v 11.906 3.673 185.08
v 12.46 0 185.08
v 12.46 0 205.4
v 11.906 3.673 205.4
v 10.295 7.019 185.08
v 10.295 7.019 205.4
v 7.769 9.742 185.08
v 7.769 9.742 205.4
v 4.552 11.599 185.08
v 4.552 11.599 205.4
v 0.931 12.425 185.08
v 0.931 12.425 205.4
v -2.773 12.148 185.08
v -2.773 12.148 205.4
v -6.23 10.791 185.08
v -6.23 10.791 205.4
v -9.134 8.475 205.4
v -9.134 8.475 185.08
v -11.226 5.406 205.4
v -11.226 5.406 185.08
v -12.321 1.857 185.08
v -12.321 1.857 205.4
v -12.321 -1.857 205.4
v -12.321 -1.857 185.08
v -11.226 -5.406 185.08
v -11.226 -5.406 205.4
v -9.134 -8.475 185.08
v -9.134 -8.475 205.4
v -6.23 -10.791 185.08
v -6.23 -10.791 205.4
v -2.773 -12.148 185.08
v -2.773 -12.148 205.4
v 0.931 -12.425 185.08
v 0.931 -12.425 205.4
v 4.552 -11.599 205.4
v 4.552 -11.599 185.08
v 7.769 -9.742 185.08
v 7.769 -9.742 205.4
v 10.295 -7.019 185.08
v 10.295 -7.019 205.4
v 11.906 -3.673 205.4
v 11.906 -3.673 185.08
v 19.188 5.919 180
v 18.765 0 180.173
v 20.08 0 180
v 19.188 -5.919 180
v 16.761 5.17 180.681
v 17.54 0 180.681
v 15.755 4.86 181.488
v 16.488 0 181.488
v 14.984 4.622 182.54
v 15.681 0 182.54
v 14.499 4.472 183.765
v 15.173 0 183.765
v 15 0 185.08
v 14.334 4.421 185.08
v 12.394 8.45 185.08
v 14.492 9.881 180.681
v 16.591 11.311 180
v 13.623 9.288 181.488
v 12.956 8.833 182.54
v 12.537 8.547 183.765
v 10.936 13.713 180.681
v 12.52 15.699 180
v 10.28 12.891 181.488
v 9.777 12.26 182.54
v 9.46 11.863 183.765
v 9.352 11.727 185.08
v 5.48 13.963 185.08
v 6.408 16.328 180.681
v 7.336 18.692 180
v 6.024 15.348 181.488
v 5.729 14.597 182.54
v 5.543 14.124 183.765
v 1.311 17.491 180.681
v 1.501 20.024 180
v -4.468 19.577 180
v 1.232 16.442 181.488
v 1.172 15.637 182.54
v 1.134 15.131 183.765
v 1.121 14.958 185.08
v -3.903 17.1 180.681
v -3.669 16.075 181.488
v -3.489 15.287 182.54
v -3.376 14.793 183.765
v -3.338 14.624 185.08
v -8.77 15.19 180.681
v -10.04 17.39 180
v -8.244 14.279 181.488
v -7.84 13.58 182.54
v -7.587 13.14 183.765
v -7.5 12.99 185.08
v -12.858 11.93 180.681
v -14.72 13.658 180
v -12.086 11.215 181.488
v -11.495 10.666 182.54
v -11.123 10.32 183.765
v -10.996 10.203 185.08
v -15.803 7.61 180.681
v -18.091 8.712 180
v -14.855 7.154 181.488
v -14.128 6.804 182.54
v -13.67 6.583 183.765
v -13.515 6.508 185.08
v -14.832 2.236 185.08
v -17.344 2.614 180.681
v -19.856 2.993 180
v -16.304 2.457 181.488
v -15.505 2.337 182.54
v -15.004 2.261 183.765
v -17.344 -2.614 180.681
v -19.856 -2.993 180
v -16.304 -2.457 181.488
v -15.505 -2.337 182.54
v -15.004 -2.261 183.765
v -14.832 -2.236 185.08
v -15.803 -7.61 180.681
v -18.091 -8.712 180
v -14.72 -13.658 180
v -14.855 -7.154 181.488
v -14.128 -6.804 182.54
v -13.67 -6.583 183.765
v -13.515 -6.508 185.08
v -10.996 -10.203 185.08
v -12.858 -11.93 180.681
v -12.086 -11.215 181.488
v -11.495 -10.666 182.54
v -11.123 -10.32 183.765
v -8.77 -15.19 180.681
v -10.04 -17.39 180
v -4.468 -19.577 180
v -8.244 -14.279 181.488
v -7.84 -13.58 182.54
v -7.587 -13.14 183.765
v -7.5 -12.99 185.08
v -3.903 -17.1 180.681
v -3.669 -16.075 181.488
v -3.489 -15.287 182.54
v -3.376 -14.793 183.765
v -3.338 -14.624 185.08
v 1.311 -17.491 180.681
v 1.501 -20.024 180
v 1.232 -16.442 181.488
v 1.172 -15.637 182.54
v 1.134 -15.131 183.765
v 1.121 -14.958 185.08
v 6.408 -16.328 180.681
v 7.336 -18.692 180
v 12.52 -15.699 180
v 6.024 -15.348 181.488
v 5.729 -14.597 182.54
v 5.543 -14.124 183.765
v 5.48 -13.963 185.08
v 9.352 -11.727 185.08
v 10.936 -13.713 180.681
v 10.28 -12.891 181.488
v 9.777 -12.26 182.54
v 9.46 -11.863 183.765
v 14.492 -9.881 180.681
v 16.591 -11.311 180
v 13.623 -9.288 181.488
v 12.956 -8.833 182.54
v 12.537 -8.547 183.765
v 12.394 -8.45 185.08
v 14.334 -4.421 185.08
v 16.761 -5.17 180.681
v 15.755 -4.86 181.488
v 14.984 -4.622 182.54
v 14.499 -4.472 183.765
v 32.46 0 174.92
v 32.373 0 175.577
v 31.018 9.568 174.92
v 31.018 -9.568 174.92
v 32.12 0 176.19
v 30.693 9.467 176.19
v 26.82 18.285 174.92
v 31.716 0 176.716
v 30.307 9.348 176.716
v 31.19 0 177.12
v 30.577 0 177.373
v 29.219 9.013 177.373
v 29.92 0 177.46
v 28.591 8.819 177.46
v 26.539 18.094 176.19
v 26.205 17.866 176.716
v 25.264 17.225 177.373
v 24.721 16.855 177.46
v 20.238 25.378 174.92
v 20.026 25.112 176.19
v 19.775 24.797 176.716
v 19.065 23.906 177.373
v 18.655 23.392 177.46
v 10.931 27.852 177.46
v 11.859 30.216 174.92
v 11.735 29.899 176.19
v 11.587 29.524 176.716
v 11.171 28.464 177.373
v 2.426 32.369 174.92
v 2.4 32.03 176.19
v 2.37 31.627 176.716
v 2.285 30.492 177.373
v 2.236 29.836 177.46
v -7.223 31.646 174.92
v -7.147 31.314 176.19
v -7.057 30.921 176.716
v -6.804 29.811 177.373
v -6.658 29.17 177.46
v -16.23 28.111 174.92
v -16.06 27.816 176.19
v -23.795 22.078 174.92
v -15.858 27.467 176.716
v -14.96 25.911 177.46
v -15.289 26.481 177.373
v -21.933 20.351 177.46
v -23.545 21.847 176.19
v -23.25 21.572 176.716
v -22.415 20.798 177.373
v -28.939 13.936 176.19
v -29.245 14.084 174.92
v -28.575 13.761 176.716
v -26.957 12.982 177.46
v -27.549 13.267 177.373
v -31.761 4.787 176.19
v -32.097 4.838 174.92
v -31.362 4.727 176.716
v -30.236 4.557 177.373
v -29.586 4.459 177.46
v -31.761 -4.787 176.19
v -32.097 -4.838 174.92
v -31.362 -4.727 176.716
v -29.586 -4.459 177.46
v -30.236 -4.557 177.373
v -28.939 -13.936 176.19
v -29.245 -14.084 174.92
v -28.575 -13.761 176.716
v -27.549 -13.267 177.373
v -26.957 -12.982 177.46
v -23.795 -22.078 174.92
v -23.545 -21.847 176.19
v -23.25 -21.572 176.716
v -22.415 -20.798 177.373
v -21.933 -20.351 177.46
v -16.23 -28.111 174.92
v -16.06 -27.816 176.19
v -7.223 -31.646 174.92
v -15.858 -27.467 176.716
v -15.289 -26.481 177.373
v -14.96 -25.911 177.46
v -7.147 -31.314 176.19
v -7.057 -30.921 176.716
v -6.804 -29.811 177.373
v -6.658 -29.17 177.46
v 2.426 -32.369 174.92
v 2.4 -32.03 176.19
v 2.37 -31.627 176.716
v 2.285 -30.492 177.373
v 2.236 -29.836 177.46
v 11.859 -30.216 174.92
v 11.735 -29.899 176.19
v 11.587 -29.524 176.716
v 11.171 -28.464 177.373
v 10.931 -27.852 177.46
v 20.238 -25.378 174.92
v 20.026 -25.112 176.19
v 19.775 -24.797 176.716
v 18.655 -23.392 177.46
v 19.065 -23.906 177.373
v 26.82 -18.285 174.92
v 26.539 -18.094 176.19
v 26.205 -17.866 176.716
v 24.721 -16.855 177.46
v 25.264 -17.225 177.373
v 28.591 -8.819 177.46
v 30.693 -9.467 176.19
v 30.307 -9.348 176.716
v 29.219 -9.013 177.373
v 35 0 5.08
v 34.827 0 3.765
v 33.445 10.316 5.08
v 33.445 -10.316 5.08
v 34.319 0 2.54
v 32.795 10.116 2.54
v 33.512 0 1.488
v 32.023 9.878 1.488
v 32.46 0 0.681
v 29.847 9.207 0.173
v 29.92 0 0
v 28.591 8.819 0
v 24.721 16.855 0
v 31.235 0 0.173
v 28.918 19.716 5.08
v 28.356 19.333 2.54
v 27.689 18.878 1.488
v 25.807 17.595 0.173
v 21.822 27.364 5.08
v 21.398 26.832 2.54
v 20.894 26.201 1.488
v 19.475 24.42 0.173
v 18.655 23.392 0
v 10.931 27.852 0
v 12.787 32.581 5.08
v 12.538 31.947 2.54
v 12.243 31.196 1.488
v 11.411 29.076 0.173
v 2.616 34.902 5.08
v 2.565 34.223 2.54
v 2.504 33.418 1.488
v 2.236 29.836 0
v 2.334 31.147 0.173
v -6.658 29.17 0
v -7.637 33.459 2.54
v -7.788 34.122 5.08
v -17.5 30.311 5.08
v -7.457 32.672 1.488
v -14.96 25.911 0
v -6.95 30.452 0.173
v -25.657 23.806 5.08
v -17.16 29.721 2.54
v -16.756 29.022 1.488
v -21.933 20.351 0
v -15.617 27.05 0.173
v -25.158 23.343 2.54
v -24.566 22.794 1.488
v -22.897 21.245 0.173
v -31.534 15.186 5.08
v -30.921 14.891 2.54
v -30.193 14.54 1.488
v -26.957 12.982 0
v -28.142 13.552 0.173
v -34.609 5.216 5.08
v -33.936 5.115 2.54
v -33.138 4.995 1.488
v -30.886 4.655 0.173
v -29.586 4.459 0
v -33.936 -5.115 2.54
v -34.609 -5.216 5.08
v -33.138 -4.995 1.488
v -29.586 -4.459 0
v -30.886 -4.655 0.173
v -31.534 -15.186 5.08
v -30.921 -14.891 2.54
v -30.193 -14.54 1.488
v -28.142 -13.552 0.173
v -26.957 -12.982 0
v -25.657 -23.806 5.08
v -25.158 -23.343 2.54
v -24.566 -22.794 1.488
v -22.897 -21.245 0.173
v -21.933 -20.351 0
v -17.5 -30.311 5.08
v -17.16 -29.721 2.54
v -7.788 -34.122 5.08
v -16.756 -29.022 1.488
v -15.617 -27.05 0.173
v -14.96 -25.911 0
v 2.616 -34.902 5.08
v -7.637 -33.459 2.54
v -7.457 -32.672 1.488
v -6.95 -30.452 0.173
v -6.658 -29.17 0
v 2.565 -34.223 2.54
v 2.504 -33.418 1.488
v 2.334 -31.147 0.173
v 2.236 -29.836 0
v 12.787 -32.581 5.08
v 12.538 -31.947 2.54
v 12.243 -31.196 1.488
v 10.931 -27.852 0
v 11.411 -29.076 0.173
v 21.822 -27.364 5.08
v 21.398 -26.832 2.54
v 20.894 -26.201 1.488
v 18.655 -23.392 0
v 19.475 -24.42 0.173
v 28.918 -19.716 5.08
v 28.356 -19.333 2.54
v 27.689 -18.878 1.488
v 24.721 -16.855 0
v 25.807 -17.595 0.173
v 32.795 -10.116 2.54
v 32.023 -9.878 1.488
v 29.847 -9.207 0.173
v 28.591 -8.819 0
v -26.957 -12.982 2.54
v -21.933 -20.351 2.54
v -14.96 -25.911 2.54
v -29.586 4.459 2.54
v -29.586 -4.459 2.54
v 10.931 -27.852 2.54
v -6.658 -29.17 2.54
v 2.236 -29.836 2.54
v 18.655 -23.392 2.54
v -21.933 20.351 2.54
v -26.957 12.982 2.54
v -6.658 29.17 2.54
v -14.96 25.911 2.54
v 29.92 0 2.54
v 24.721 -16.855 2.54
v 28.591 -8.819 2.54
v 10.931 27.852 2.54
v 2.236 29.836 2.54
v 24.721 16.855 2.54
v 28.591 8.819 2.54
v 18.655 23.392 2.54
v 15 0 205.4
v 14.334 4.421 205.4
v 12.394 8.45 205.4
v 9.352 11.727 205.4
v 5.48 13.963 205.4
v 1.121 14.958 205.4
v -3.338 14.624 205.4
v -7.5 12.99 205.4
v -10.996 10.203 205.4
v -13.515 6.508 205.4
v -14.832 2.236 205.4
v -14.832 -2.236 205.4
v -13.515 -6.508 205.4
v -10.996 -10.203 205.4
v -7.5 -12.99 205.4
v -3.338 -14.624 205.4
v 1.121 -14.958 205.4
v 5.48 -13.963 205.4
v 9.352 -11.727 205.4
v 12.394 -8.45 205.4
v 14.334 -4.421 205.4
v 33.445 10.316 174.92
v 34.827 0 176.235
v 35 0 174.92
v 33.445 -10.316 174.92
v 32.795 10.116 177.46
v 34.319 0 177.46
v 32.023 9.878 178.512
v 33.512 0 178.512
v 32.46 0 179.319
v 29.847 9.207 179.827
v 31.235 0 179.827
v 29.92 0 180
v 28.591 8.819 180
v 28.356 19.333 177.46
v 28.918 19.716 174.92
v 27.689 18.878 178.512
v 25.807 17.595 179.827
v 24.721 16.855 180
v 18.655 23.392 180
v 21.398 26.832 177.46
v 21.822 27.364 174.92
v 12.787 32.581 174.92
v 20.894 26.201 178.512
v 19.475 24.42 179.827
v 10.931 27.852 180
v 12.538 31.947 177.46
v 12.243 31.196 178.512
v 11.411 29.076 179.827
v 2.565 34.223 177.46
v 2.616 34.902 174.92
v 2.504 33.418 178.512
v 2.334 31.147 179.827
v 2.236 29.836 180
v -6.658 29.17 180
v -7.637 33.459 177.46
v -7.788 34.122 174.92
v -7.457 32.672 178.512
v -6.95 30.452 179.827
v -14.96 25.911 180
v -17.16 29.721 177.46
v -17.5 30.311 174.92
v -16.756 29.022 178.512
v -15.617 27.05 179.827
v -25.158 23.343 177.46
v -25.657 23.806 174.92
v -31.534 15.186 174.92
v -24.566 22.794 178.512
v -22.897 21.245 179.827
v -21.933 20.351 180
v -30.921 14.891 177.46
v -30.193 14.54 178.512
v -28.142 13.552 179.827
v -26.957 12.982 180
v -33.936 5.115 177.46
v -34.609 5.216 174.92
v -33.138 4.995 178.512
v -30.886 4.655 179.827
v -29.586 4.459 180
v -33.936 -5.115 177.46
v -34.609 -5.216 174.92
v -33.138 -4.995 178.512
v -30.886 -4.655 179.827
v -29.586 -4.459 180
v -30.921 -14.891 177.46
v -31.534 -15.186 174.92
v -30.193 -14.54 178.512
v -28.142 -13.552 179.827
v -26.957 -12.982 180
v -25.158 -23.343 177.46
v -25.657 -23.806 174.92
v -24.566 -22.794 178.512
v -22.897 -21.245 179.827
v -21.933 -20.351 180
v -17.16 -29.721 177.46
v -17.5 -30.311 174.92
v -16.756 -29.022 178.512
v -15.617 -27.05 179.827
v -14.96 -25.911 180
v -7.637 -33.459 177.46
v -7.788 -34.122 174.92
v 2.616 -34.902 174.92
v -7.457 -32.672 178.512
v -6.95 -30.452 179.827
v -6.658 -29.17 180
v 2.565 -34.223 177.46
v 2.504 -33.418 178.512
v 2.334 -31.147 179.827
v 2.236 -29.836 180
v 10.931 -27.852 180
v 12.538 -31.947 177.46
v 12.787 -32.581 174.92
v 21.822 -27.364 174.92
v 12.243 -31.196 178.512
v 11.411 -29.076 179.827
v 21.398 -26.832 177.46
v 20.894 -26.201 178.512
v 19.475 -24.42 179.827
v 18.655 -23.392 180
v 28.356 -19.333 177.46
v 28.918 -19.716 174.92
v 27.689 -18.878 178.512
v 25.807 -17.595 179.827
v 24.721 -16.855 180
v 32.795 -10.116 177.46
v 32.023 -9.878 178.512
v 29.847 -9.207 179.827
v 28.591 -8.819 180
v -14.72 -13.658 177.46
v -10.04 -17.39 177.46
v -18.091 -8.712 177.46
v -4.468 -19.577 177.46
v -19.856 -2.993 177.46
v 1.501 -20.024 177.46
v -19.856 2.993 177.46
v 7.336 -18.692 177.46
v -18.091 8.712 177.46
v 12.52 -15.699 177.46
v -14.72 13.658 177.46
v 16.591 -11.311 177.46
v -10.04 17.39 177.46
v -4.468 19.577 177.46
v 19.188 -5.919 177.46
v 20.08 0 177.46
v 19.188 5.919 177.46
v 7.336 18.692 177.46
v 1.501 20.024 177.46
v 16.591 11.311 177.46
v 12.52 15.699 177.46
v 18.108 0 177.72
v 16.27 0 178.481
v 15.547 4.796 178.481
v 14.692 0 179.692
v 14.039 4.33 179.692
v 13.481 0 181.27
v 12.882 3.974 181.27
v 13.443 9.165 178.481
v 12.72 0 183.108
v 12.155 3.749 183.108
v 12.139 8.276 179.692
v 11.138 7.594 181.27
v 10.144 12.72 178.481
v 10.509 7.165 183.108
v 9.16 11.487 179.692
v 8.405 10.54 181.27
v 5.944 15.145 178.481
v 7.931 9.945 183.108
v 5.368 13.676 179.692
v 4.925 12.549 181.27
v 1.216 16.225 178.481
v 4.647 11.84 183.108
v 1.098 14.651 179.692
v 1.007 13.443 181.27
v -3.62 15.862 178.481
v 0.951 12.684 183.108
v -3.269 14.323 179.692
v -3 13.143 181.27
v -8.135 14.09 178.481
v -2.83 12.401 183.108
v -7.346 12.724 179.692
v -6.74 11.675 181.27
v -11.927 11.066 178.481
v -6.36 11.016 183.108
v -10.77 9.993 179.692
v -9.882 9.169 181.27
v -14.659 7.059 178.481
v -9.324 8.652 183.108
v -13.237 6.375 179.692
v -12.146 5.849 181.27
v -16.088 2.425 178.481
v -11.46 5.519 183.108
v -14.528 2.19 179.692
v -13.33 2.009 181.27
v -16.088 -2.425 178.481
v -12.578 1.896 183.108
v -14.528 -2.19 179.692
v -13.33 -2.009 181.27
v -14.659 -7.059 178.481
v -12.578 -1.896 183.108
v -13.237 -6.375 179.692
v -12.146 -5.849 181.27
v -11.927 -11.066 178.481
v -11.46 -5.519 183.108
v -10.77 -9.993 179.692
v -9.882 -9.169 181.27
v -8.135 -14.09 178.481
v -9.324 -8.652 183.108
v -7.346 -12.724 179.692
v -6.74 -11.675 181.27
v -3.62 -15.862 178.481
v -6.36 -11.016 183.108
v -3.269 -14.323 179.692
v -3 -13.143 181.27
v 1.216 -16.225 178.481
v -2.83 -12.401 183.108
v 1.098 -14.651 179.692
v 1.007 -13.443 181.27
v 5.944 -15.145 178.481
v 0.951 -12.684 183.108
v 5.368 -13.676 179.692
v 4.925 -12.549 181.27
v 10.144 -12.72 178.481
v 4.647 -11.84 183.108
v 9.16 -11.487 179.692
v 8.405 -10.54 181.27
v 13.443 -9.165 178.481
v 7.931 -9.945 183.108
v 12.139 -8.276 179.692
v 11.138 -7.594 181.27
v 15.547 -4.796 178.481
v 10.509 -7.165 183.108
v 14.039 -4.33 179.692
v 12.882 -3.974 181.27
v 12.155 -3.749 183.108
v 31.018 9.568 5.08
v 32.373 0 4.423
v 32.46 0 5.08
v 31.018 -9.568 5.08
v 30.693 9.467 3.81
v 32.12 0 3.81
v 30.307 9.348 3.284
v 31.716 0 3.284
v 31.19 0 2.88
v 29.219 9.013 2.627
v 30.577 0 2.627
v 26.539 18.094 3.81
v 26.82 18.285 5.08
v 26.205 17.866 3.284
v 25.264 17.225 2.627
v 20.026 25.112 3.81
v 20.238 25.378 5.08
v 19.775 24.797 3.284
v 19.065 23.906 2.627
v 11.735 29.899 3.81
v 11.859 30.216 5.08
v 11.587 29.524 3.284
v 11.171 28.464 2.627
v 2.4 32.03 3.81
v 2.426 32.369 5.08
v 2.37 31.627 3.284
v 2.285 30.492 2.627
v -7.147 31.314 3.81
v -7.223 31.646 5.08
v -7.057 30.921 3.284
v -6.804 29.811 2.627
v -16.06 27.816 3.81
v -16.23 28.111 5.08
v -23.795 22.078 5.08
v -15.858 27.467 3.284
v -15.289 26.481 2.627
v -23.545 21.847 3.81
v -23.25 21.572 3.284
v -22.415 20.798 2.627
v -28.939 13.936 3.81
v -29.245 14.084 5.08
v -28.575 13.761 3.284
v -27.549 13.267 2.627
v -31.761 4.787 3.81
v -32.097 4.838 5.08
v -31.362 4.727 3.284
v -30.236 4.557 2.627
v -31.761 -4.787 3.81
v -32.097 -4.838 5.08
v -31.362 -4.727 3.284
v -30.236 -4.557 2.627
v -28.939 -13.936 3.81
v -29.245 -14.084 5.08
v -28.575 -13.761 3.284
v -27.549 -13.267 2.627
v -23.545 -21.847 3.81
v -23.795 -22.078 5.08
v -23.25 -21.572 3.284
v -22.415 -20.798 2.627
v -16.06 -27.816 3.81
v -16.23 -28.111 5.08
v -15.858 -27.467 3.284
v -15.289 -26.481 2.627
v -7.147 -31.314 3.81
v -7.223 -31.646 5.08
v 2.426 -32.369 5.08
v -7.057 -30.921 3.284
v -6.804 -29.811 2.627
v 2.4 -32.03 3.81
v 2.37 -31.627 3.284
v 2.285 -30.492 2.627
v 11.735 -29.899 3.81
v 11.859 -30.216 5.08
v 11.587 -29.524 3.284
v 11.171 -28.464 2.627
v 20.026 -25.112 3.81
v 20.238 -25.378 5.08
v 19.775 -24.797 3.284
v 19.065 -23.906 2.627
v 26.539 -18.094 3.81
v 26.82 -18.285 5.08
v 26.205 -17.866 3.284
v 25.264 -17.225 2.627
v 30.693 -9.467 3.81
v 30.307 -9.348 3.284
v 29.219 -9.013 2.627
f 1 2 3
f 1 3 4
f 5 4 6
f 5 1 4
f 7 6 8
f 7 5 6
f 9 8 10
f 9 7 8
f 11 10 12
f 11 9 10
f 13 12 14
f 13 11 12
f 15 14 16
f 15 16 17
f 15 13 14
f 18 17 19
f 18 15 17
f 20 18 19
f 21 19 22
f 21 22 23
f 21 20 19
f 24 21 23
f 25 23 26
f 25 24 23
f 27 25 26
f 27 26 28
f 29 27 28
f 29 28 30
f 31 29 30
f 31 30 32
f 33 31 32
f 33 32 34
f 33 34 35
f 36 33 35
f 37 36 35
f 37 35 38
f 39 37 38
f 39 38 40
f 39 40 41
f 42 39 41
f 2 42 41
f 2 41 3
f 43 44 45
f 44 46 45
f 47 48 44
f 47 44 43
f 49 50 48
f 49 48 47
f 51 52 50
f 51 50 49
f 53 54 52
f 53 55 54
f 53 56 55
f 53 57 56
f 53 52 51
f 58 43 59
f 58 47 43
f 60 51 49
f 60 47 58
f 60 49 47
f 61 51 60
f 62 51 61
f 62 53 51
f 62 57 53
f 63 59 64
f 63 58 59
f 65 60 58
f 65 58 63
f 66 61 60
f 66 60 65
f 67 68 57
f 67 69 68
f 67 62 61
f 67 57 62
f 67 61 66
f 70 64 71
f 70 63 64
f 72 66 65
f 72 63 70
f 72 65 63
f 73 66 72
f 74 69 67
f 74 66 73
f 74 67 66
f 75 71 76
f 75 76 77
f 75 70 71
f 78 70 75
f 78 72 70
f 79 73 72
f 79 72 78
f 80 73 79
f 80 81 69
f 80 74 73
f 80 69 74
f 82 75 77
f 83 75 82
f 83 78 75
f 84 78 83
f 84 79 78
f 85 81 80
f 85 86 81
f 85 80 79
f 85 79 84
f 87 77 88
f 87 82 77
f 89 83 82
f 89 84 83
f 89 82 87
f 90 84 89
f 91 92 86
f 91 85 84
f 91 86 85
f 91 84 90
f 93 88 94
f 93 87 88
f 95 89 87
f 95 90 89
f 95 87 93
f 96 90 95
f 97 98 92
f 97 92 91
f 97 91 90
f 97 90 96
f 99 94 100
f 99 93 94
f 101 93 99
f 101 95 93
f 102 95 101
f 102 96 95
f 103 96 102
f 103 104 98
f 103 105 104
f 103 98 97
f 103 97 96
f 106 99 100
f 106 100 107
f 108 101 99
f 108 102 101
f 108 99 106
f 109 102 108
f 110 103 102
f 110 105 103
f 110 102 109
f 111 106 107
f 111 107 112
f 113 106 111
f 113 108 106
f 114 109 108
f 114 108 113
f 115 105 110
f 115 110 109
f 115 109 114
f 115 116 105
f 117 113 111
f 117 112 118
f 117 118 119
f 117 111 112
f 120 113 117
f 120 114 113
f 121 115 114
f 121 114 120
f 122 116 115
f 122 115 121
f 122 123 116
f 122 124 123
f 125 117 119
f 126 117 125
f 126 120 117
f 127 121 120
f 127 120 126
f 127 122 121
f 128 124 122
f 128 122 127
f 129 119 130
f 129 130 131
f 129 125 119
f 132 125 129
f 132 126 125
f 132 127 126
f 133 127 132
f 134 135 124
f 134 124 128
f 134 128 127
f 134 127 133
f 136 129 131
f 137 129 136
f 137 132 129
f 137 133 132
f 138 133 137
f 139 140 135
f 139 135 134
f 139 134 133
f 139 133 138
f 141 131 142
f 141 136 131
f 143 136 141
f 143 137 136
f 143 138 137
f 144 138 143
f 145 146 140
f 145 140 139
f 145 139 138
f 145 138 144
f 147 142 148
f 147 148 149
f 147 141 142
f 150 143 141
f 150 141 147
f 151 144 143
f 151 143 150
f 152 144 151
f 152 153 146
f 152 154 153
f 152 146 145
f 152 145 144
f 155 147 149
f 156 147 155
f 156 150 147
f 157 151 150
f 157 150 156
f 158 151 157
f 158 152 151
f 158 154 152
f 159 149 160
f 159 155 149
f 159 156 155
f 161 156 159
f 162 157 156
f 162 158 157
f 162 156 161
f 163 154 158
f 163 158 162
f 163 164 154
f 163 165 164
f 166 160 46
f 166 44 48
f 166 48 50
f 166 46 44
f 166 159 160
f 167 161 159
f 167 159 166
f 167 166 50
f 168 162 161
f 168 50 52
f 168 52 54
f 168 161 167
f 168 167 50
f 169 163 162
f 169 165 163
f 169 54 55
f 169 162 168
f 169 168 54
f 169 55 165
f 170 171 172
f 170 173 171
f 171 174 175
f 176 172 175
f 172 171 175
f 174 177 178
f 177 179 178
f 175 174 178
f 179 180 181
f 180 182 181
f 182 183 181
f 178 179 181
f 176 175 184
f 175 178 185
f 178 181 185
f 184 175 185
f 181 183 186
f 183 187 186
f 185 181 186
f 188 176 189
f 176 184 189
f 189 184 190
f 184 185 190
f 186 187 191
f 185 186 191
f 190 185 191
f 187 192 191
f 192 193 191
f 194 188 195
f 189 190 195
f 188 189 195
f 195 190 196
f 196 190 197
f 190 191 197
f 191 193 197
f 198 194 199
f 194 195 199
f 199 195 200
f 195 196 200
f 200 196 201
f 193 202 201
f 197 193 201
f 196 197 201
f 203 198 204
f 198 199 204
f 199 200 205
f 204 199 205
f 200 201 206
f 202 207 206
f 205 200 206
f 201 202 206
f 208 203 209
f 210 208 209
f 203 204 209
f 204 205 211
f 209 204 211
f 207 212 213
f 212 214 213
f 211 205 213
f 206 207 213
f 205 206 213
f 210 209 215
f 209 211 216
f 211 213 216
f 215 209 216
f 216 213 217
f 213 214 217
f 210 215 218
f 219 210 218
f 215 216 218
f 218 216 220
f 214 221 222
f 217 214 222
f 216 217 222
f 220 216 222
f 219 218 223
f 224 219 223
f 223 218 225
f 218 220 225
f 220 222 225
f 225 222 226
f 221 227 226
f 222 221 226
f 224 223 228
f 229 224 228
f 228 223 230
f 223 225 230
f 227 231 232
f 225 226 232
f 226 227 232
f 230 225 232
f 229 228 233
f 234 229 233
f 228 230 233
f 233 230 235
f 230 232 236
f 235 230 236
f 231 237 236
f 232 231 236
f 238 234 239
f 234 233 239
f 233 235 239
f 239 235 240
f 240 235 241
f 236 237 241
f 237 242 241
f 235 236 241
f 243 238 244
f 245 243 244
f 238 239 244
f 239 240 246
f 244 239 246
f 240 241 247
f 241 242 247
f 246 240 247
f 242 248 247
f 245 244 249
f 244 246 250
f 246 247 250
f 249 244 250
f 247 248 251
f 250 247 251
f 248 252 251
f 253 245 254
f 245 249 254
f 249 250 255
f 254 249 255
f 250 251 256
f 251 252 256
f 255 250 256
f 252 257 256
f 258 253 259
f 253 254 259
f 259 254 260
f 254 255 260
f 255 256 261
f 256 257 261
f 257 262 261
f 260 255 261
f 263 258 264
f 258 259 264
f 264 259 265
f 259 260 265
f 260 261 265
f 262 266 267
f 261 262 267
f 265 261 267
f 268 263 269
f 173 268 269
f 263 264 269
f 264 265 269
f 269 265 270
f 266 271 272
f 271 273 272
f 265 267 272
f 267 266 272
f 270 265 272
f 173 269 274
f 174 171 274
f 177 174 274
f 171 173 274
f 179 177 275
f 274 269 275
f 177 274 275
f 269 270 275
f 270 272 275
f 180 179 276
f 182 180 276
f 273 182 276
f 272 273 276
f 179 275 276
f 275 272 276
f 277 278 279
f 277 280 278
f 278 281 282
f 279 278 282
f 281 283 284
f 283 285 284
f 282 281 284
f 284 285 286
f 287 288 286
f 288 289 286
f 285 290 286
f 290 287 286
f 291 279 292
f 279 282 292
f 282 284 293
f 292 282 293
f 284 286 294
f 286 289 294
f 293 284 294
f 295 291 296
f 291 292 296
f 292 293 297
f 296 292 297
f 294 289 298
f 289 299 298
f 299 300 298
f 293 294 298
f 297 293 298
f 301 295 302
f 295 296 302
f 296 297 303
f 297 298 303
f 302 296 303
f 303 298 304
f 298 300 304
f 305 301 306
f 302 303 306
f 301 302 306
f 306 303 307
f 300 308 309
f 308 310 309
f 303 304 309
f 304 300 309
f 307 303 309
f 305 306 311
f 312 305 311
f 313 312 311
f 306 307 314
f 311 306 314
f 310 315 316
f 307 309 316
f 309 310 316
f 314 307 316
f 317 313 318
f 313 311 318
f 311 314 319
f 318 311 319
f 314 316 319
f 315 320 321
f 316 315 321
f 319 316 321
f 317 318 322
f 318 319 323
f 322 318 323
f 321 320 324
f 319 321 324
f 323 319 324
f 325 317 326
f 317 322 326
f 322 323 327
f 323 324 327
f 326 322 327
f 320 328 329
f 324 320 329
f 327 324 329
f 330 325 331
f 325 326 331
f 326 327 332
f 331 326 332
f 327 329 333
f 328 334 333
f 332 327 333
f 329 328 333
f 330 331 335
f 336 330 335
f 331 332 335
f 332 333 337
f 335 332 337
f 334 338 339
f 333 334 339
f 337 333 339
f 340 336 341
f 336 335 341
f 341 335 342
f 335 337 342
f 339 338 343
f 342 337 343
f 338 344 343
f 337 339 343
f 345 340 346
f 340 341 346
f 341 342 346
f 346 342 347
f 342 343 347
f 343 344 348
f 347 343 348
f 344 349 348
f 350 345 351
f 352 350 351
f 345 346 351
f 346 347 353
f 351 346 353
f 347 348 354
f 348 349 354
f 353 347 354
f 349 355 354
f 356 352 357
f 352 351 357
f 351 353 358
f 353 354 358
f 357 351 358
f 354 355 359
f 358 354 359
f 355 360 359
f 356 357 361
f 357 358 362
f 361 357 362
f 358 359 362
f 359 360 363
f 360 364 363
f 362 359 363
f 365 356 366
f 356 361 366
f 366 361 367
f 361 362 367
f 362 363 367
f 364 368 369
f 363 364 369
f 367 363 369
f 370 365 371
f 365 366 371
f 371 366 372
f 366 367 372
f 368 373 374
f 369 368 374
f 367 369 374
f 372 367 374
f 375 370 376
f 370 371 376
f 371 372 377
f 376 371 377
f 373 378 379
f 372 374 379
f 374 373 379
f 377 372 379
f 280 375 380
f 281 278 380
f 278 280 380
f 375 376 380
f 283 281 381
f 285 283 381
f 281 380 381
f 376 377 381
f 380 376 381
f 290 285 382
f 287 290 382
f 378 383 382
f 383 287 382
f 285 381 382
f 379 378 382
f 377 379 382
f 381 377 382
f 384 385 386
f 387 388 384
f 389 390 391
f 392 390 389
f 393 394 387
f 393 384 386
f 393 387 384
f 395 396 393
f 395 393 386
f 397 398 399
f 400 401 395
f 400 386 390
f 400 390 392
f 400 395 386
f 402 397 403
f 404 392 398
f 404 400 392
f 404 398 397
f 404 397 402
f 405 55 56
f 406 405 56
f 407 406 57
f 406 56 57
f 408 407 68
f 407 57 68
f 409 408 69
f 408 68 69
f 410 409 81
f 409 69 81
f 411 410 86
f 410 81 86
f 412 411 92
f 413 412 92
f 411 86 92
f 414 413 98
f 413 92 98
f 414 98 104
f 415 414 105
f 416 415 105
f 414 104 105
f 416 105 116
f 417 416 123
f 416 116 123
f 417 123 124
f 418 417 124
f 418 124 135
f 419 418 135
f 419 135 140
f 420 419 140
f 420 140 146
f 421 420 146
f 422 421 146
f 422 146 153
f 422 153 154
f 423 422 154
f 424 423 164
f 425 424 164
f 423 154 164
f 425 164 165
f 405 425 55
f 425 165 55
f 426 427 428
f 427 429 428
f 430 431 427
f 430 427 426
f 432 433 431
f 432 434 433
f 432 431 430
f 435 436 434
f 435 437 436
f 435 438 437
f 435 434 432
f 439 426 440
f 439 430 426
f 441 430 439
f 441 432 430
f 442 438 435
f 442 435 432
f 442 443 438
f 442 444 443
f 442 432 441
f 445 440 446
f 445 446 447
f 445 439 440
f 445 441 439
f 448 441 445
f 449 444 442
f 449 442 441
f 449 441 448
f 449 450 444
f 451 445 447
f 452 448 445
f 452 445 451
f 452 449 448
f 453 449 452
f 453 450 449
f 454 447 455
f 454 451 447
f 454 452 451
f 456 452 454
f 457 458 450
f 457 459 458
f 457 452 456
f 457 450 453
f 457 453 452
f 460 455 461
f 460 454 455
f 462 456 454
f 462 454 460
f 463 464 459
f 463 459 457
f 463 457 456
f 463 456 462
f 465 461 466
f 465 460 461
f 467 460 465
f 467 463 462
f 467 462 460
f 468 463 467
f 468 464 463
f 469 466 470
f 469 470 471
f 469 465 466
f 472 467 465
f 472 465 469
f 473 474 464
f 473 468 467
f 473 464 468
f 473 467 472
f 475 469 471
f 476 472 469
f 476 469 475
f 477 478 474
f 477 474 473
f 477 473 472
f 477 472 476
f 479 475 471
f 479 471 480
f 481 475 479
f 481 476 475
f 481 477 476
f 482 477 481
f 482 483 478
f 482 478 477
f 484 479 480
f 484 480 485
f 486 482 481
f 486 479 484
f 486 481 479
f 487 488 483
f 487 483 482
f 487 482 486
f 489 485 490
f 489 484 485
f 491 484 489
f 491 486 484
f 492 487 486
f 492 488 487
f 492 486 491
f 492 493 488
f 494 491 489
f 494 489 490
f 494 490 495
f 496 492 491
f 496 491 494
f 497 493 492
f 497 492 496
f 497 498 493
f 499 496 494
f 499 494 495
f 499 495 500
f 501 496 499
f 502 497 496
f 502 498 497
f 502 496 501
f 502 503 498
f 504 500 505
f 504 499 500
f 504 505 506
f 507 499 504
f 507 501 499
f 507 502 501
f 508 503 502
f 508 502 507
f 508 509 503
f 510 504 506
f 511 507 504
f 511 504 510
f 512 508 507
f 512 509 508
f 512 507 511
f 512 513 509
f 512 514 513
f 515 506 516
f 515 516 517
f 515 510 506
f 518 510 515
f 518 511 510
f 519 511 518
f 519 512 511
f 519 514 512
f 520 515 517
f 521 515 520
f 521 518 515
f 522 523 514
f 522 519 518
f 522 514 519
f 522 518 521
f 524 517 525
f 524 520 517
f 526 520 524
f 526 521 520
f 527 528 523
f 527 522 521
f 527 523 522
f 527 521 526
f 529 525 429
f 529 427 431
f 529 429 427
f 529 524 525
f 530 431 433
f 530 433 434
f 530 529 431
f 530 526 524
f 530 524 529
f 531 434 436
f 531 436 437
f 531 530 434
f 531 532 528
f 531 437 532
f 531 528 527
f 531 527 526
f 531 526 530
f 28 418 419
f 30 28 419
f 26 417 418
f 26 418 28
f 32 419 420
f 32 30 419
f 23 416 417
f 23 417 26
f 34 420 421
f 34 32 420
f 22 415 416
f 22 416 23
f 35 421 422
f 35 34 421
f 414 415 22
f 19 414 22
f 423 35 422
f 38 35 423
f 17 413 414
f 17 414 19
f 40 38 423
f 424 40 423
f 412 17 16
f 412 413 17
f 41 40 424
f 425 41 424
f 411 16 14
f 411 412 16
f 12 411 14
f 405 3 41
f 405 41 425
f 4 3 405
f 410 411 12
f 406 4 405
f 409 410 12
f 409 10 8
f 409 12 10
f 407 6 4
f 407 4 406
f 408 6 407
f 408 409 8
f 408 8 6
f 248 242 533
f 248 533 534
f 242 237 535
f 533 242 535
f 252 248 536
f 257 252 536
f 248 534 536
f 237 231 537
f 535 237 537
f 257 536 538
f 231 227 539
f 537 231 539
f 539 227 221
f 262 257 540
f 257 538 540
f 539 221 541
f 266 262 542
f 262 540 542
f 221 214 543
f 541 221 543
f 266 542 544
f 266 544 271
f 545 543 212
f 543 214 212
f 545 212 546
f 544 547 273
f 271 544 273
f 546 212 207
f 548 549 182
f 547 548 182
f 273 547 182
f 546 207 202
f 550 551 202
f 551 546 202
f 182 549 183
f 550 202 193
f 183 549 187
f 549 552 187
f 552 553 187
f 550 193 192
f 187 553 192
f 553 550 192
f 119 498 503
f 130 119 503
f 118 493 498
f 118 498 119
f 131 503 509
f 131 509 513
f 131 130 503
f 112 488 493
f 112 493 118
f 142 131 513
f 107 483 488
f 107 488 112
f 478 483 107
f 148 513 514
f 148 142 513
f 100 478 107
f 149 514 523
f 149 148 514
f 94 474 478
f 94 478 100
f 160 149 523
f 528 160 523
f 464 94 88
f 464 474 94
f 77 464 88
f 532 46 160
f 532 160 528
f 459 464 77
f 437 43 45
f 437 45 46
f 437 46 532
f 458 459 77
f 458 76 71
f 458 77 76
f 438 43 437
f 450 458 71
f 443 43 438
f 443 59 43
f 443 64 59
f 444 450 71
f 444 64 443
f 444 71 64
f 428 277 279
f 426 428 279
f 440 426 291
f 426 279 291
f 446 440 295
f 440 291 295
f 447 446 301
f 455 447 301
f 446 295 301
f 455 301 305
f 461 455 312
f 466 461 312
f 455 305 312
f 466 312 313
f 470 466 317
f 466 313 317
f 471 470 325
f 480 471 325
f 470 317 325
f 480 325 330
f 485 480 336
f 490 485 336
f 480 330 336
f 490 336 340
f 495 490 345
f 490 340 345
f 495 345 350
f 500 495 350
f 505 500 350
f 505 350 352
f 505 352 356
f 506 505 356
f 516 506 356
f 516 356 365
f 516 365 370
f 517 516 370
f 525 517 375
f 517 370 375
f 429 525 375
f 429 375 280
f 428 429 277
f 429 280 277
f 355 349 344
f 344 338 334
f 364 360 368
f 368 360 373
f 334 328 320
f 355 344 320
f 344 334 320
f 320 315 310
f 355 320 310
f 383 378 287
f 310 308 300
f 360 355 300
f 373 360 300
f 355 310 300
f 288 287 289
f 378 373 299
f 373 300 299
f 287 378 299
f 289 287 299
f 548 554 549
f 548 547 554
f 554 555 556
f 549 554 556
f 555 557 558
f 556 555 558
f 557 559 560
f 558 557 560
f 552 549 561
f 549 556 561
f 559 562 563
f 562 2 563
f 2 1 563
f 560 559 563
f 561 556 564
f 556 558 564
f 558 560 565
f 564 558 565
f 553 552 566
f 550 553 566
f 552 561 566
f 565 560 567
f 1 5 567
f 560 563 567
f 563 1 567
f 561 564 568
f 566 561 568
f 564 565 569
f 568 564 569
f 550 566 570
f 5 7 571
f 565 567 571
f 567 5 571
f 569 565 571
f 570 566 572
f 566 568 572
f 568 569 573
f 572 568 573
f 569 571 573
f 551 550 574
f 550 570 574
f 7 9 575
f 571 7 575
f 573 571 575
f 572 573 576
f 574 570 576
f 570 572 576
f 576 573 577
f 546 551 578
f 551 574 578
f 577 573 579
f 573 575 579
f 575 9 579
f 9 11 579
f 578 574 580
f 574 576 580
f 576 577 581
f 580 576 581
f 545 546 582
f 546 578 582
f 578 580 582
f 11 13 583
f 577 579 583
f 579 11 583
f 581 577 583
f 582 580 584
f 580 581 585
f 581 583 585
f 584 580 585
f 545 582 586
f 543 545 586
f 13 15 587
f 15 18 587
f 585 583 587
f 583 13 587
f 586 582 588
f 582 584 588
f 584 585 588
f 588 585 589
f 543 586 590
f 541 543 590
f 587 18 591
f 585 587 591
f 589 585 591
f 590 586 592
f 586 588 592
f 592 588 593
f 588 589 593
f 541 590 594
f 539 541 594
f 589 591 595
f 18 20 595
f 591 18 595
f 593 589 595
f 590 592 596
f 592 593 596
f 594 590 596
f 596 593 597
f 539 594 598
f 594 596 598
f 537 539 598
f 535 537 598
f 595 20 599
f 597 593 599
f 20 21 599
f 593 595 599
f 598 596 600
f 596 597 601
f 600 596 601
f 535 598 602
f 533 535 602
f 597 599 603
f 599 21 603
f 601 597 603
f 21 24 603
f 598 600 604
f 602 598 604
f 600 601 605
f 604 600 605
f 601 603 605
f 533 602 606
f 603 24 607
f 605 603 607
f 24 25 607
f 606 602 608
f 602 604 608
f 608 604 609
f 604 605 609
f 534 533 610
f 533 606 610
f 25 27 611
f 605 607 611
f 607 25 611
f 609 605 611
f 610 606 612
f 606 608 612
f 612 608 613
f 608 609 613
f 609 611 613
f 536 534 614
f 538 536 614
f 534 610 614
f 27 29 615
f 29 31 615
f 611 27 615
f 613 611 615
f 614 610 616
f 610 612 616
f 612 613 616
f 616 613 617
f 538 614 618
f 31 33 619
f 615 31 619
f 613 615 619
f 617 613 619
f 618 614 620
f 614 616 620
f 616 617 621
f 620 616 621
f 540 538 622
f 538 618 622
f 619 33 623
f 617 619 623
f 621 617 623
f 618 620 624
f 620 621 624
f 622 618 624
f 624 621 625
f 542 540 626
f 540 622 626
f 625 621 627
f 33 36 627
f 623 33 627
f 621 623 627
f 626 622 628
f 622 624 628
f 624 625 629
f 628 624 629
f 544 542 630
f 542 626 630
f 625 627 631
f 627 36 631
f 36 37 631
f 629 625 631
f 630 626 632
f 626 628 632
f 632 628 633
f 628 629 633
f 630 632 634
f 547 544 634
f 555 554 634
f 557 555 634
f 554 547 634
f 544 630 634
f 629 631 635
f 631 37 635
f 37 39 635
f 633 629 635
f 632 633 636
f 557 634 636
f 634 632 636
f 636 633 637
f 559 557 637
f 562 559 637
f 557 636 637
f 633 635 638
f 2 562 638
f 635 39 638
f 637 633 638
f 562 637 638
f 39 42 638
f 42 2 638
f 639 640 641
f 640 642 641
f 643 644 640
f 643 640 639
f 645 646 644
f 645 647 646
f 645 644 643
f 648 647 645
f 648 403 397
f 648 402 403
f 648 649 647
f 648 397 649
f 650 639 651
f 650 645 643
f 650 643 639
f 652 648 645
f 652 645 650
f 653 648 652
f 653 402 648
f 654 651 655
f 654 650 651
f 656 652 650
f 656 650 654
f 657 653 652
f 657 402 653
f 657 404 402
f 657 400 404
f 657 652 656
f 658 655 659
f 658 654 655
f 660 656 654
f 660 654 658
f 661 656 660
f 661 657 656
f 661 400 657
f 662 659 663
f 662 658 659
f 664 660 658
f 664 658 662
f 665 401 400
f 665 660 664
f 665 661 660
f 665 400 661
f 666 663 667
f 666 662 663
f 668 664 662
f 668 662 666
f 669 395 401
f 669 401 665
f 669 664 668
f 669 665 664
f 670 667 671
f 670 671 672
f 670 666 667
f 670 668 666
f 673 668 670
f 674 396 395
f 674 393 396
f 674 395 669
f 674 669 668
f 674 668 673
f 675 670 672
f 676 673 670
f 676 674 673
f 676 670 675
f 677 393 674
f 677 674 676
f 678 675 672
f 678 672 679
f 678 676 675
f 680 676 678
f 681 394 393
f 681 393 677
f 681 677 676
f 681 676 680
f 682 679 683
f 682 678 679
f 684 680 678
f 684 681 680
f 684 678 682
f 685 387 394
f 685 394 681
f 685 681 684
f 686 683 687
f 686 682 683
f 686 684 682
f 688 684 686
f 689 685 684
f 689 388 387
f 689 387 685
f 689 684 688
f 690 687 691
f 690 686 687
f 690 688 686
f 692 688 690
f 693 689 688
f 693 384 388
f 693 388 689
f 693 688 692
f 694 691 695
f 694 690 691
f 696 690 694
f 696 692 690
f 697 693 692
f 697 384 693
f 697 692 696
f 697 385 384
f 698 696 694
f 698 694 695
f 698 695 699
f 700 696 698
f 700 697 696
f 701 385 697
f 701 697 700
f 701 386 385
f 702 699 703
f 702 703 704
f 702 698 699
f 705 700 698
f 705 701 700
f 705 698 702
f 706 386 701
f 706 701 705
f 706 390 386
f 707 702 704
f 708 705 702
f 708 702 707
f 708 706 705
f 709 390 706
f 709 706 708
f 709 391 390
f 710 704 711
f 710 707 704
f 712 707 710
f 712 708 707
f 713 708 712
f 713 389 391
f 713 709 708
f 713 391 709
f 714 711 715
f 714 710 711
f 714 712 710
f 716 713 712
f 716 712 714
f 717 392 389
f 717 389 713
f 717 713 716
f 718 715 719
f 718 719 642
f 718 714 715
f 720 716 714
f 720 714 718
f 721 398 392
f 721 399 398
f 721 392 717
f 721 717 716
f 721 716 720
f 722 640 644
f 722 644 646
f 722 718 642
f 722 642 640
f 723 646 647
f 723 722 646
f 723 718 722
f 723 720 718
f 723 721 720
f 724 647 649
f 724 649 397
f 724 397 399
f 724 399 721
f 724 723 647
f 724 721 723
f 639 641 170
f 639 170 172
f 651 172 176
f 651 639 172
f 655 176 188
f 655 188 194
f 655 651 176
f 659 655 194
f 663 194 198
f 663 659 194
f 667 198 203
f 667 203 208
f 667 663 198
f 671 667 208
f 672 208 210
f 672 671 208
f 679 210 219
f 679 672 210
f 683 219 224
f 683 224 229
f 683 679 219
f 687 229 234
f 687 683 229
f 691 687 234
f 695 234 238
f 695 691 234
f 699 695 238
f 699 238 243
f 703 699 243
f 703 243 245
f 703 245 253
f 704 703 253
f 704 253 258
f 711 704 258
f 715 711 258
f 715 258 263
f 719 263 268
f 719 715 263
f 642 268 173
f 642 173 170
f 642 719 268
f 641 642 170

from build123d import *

# Parameters (mm, degrees)
F0_R     = 35
F1_DEPTH = 180
F2_R     = 15
F3_DEPTH = 25.4
F4_R     = 5.08
F5_R     = 5.08
F6_R     = 14.574331
F6_R_2   = 29.92
F7_DEPTH = 6.858
F8_T     = -2.54


with BuildPart() as f1:
    # F0 (on Top) → F1 (new body)
    with BuildSketch(Plane.XY):
        Circle(F0_R)
    extrude(amount=F1_DEPTH)

    # F2 (on face) → F3 (join)
    with BuildSketch(Plane.XY.offset(180)):
        Circle(F2_R)
    extrude(amount=F3_DEPTH)

    # F4
    f4_edges = [f1.edges().sort_by_distance(p)[0] for p in [
        (-35, 0, 180),
    ]]
    fillet(f4_edges, radius=F4_R)

    # F5
    f5_edges = [f1.edges().sort_by_distance(p)[0] for p in [
        (-35, 0, 0),
        (-15, 0, 180),
    ]]
    fillet(f5_edges, radius=F5_R)

    # F6 (on face) → F7 (join)
    with BuildSketch(Plane(origin=(0, 0, 0), x_dir=(1, 0, 0), z_dir=(0, 0, -1))):
        Circle(F6_R)
        Circle(F6_R_2)
        Circle(F6_R, mode=Mode.SUBTRACT)
    extrude(amount=-F7_DEPTH)

    # F8
    f8_openings = [f1.faces().sort_by_distance(p)[0] for p in [
        (0, 0, 205.4),
    ]]
    offset(amount=F8_T, openings=f8_openings)


solid = f1.part
